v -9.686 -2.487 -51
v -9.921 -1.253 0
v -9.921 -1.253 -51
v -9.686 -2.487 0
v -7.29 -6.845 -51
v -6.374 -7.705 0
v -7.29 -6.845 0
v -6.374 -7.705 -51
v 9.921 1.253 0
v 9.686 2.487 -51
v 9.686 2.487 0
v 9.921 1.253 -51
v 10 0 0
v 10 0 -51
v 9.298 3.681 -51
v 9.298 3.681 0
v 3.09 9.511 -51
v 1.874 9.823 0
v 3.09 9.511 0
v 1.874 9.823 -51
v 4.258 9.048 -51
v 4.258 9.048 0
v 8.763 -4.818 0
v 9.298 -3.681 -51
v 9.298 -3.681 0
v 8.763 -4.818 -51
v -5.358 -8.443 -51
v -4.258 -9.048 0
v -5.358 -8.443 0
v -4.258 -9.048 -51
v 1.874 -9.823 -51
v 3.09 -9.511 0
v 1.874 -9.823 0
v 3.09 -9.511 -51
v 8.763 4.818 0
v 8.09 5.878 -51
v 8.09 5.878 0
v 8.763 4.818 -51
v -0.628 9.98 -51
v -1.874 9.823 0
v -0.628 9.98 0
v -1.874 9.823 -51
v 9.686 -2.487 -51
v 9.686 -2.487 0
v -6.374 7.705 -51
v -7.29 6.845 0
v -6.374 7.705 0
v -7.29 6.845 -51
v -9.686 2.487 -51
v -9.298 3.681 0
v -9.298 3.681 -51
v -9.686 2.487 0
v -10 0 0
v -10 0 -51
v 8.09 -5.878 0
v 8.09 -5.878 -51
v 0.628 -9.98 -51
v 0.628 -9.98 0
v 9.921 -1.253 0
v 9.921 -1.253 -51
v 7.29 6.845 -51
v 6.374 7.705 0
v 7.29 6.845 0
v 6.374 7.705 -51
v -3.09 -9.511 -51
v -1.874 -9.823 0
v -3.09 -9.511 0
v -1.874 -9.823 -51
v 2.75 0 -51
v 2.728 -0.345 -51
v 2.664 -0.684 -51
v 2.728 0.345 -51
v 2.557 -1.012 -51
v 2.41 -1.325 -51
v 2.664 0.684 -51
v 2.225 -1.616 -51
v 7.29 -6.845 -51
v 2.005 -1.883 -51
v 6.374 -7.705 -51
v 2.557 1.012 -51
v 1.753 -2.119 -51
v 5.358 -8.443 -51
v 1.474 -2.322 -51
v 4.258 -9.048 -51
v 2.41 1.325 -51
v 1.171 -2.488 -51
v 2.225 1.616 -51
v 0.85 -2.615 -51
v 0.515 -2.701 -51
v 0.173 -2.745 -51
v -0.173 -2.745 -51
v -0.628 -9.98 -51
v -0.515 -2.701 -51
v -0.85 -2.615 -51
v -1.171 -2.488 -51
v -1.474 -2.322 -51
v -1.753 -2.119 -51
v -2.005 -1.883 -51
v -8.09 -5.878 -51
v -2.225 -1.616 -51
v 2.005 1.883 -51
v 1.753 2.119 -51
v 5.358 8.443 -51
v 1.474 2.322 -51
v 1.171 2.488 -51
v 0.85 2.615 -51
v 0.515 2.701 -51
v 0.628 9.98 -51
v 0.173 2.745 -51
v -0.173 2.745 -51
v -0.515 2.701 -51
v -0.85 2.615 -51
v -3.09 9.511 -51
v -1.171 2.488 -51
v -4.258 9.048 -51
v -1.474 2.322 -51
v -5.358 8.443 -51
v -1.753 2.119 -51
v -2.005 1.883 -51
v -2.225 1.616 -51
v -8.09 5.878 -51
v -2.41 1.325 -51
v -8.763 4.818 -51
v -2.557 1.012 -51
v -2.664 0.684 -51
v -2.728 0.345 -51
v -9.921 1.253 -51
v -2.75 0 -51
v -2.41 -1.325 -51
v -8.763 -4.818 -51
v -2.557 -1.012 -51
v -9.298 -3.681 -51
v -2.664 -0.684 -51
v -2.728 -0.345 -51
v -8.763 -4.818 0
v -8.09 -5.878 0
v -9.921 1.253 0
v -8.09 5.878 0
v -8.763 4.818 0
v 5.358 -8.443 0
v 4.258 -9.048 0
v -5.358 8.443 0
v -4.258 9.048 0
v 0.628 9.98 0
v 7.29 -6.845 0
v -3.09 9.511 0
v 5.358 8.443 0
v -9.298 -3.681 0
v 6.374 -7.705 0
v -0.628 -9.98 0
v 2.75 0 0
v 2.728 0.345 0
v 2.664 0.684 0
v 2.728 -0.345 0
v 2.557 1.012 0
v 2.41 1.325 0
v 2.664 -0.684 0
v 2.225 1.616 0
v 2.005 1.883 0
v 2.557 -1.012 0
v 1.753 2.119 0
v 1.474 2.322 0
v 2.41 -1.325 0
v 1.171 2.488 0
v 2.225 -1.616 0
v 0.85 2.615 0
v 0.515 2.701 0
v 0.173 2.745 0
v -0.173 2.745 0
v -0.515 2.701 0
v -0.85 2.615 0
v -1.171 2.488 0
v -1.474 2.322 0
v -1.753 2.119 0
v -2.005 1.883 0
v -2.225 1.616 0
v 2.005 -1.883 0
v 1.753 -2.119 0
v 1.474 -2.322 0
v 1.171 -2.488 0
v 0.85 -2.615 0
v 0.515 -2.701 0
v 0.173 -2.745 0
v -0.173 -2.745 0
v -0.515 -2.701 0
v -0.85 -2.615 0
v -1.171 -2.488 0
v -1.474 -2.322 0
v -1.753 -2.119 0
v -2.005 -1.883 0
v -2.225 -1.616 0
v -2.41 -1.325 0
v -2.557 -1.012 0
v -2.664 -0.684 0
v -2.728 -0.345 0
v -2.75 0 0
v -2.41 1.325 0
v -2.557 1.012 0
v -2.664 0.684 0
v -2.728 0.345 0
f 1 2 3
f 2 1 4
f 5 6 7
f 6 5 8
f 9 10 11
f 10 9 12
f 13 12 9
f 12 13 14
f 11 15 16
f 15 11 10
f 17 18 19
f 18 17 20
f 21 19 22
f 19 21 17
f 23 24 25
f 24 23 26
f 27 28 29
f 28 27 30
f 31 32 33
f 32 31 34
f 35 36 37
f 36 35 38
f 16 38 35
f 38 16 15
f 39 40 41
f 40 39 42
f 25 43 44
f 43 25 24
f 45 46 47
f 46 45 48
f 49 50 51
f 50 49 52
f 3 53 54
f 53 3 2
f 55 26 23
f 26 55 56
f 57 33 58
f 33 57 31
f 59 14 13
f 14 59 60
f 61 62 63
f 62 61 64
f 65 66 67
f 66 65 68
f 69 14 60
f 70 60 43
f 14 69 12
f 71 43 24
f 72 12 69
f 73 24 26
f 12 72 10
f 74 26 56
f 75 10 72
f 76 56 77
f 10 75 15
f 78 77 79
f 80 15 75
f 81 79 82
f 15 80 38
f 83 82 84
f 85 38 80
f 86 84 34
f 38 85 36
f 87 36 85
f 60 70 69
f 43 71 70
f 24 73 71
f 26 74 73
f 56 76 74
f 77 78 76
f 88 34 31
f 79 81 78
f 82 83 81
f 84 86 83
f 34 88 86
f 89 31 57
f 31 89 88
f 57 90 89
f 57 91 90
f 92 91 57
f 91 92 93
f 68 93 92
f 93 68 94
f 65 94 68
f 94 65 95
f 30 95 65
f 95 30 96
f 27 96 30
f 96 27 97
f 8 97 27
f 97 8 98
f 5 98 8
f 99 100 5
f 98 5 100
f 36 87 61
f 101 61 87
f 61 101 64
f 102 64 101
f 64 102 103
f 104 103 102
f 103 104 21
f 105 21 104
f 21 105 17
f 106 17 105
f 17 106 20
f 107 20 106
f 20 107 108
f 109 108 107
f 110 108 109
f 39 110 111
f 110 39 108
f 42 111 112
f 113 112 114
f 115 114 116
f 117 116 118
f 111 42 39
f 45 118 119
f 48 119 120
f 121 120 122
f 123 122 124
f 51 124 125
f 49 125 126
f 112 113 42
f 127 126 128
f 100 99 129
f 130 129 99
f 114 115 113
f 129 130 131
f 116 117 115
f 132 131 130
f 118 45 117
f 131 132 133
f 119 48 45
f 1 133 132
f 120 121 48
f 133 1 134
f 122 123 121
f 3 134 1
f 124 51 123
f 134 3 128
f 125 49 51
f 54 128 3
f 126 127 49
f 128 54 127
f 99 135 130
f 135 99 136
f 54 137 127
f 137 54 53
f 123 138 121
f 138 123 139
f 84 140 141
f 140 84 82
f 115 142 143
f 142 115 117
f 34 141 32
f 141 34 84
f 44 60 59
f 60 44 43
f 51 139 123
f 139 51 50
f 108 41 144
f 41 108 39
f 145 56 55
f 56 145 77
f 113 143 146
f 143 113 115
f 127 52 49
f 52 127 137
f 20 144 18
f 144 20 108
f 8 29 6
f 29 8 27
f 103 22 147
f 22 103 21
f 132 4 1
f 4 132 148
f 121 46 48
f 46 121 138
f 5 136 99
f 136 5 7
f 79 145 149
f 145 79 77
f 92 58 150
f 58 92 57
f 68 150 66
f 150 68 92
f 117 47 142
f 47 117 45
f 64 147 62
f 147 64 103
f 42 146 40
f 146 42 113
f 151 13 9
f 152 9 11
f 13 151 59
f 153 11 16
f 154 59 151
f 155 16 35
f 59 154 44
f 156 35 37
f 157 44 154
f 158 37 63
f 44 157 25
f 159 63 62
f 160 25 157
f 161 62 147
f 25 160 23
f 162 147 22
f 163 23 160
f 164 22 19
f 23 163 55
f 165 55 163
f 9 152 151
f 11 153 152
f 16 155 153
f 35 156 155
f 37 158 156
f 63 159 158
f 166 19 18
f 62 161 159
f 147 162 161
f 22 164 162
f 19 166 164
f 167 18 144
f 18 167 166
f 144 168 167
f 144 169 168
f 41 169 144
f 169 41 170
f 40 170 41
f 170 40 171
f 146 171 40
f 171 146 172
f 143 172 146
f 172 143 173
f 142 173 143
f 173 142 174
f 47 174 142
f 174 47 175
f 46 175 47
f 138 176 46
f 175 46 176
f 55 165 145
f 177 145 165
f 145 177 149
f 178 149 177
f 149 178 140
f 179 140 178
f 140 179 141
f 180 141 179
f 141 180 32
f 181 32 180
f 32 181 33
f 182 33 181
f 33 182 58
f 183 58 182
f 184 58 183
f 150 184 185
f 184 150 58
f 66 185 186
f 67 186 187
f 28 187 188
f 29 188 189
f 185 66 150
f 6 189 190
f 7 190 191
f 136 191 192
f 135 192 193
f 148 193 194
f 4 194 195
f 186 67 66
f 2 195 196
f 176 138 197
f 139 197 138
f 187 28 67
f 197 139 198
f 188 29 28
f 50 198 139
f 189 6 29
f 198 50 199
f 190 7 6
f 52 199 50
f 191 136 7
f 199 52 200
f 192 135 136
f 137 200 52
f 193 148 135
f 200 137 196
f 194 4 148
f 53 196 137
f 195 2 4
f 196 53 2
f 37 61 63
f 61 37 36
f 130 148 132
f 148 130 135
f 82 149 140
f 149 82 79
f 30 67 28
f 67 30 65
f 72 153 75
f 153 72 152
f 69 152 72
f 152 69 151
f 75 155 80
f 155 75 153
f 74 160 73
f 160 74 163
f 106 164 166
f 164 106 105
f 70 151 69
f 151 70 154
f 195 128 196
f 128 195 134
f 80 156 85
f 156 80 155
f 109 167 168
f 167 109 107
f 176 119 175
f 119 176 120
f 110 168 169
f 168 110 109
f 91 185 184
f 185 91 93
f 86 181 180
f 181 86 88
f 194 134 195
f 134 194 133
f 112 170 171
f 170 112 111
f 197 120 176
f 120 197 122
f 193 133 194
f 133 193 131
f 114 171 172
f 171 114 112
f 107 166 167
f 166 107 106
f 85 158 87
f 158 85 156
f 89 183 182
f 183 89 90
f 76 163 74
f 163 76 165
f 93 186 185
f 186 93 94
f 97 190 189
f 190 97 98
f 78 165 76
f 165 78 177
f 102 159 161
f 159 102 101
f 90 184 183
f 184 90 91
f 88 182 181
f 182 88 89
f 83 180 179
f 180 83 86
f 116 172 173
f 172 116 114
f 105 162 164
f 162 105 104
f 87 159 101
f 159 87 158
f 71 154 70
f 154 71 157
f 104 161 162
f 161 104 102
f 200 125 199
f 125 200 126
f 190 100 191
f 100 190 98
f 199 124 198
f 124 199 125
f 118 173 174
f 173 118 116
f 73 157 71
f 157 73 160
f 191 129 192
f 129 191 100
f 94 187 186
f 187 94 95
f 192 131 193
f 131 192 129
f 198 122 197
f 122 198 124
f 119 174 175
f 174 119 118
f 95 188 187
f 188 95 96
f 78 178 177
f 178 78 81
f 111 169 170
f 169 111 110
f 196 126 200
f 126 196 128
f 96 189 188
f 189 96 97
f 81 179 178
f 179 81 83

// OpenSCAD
$fn = 50;


difference() {
	union() {
		translate(v = [0, 0, -51.0000000000]) {
			cylinder(h = 51, r = 10.0000000000);
		}
	}
	union() {
		#translate(v = [0, 0, -51]) {
			cylinder(h = 51, r = 2.7500000000);
		}
	}
}
